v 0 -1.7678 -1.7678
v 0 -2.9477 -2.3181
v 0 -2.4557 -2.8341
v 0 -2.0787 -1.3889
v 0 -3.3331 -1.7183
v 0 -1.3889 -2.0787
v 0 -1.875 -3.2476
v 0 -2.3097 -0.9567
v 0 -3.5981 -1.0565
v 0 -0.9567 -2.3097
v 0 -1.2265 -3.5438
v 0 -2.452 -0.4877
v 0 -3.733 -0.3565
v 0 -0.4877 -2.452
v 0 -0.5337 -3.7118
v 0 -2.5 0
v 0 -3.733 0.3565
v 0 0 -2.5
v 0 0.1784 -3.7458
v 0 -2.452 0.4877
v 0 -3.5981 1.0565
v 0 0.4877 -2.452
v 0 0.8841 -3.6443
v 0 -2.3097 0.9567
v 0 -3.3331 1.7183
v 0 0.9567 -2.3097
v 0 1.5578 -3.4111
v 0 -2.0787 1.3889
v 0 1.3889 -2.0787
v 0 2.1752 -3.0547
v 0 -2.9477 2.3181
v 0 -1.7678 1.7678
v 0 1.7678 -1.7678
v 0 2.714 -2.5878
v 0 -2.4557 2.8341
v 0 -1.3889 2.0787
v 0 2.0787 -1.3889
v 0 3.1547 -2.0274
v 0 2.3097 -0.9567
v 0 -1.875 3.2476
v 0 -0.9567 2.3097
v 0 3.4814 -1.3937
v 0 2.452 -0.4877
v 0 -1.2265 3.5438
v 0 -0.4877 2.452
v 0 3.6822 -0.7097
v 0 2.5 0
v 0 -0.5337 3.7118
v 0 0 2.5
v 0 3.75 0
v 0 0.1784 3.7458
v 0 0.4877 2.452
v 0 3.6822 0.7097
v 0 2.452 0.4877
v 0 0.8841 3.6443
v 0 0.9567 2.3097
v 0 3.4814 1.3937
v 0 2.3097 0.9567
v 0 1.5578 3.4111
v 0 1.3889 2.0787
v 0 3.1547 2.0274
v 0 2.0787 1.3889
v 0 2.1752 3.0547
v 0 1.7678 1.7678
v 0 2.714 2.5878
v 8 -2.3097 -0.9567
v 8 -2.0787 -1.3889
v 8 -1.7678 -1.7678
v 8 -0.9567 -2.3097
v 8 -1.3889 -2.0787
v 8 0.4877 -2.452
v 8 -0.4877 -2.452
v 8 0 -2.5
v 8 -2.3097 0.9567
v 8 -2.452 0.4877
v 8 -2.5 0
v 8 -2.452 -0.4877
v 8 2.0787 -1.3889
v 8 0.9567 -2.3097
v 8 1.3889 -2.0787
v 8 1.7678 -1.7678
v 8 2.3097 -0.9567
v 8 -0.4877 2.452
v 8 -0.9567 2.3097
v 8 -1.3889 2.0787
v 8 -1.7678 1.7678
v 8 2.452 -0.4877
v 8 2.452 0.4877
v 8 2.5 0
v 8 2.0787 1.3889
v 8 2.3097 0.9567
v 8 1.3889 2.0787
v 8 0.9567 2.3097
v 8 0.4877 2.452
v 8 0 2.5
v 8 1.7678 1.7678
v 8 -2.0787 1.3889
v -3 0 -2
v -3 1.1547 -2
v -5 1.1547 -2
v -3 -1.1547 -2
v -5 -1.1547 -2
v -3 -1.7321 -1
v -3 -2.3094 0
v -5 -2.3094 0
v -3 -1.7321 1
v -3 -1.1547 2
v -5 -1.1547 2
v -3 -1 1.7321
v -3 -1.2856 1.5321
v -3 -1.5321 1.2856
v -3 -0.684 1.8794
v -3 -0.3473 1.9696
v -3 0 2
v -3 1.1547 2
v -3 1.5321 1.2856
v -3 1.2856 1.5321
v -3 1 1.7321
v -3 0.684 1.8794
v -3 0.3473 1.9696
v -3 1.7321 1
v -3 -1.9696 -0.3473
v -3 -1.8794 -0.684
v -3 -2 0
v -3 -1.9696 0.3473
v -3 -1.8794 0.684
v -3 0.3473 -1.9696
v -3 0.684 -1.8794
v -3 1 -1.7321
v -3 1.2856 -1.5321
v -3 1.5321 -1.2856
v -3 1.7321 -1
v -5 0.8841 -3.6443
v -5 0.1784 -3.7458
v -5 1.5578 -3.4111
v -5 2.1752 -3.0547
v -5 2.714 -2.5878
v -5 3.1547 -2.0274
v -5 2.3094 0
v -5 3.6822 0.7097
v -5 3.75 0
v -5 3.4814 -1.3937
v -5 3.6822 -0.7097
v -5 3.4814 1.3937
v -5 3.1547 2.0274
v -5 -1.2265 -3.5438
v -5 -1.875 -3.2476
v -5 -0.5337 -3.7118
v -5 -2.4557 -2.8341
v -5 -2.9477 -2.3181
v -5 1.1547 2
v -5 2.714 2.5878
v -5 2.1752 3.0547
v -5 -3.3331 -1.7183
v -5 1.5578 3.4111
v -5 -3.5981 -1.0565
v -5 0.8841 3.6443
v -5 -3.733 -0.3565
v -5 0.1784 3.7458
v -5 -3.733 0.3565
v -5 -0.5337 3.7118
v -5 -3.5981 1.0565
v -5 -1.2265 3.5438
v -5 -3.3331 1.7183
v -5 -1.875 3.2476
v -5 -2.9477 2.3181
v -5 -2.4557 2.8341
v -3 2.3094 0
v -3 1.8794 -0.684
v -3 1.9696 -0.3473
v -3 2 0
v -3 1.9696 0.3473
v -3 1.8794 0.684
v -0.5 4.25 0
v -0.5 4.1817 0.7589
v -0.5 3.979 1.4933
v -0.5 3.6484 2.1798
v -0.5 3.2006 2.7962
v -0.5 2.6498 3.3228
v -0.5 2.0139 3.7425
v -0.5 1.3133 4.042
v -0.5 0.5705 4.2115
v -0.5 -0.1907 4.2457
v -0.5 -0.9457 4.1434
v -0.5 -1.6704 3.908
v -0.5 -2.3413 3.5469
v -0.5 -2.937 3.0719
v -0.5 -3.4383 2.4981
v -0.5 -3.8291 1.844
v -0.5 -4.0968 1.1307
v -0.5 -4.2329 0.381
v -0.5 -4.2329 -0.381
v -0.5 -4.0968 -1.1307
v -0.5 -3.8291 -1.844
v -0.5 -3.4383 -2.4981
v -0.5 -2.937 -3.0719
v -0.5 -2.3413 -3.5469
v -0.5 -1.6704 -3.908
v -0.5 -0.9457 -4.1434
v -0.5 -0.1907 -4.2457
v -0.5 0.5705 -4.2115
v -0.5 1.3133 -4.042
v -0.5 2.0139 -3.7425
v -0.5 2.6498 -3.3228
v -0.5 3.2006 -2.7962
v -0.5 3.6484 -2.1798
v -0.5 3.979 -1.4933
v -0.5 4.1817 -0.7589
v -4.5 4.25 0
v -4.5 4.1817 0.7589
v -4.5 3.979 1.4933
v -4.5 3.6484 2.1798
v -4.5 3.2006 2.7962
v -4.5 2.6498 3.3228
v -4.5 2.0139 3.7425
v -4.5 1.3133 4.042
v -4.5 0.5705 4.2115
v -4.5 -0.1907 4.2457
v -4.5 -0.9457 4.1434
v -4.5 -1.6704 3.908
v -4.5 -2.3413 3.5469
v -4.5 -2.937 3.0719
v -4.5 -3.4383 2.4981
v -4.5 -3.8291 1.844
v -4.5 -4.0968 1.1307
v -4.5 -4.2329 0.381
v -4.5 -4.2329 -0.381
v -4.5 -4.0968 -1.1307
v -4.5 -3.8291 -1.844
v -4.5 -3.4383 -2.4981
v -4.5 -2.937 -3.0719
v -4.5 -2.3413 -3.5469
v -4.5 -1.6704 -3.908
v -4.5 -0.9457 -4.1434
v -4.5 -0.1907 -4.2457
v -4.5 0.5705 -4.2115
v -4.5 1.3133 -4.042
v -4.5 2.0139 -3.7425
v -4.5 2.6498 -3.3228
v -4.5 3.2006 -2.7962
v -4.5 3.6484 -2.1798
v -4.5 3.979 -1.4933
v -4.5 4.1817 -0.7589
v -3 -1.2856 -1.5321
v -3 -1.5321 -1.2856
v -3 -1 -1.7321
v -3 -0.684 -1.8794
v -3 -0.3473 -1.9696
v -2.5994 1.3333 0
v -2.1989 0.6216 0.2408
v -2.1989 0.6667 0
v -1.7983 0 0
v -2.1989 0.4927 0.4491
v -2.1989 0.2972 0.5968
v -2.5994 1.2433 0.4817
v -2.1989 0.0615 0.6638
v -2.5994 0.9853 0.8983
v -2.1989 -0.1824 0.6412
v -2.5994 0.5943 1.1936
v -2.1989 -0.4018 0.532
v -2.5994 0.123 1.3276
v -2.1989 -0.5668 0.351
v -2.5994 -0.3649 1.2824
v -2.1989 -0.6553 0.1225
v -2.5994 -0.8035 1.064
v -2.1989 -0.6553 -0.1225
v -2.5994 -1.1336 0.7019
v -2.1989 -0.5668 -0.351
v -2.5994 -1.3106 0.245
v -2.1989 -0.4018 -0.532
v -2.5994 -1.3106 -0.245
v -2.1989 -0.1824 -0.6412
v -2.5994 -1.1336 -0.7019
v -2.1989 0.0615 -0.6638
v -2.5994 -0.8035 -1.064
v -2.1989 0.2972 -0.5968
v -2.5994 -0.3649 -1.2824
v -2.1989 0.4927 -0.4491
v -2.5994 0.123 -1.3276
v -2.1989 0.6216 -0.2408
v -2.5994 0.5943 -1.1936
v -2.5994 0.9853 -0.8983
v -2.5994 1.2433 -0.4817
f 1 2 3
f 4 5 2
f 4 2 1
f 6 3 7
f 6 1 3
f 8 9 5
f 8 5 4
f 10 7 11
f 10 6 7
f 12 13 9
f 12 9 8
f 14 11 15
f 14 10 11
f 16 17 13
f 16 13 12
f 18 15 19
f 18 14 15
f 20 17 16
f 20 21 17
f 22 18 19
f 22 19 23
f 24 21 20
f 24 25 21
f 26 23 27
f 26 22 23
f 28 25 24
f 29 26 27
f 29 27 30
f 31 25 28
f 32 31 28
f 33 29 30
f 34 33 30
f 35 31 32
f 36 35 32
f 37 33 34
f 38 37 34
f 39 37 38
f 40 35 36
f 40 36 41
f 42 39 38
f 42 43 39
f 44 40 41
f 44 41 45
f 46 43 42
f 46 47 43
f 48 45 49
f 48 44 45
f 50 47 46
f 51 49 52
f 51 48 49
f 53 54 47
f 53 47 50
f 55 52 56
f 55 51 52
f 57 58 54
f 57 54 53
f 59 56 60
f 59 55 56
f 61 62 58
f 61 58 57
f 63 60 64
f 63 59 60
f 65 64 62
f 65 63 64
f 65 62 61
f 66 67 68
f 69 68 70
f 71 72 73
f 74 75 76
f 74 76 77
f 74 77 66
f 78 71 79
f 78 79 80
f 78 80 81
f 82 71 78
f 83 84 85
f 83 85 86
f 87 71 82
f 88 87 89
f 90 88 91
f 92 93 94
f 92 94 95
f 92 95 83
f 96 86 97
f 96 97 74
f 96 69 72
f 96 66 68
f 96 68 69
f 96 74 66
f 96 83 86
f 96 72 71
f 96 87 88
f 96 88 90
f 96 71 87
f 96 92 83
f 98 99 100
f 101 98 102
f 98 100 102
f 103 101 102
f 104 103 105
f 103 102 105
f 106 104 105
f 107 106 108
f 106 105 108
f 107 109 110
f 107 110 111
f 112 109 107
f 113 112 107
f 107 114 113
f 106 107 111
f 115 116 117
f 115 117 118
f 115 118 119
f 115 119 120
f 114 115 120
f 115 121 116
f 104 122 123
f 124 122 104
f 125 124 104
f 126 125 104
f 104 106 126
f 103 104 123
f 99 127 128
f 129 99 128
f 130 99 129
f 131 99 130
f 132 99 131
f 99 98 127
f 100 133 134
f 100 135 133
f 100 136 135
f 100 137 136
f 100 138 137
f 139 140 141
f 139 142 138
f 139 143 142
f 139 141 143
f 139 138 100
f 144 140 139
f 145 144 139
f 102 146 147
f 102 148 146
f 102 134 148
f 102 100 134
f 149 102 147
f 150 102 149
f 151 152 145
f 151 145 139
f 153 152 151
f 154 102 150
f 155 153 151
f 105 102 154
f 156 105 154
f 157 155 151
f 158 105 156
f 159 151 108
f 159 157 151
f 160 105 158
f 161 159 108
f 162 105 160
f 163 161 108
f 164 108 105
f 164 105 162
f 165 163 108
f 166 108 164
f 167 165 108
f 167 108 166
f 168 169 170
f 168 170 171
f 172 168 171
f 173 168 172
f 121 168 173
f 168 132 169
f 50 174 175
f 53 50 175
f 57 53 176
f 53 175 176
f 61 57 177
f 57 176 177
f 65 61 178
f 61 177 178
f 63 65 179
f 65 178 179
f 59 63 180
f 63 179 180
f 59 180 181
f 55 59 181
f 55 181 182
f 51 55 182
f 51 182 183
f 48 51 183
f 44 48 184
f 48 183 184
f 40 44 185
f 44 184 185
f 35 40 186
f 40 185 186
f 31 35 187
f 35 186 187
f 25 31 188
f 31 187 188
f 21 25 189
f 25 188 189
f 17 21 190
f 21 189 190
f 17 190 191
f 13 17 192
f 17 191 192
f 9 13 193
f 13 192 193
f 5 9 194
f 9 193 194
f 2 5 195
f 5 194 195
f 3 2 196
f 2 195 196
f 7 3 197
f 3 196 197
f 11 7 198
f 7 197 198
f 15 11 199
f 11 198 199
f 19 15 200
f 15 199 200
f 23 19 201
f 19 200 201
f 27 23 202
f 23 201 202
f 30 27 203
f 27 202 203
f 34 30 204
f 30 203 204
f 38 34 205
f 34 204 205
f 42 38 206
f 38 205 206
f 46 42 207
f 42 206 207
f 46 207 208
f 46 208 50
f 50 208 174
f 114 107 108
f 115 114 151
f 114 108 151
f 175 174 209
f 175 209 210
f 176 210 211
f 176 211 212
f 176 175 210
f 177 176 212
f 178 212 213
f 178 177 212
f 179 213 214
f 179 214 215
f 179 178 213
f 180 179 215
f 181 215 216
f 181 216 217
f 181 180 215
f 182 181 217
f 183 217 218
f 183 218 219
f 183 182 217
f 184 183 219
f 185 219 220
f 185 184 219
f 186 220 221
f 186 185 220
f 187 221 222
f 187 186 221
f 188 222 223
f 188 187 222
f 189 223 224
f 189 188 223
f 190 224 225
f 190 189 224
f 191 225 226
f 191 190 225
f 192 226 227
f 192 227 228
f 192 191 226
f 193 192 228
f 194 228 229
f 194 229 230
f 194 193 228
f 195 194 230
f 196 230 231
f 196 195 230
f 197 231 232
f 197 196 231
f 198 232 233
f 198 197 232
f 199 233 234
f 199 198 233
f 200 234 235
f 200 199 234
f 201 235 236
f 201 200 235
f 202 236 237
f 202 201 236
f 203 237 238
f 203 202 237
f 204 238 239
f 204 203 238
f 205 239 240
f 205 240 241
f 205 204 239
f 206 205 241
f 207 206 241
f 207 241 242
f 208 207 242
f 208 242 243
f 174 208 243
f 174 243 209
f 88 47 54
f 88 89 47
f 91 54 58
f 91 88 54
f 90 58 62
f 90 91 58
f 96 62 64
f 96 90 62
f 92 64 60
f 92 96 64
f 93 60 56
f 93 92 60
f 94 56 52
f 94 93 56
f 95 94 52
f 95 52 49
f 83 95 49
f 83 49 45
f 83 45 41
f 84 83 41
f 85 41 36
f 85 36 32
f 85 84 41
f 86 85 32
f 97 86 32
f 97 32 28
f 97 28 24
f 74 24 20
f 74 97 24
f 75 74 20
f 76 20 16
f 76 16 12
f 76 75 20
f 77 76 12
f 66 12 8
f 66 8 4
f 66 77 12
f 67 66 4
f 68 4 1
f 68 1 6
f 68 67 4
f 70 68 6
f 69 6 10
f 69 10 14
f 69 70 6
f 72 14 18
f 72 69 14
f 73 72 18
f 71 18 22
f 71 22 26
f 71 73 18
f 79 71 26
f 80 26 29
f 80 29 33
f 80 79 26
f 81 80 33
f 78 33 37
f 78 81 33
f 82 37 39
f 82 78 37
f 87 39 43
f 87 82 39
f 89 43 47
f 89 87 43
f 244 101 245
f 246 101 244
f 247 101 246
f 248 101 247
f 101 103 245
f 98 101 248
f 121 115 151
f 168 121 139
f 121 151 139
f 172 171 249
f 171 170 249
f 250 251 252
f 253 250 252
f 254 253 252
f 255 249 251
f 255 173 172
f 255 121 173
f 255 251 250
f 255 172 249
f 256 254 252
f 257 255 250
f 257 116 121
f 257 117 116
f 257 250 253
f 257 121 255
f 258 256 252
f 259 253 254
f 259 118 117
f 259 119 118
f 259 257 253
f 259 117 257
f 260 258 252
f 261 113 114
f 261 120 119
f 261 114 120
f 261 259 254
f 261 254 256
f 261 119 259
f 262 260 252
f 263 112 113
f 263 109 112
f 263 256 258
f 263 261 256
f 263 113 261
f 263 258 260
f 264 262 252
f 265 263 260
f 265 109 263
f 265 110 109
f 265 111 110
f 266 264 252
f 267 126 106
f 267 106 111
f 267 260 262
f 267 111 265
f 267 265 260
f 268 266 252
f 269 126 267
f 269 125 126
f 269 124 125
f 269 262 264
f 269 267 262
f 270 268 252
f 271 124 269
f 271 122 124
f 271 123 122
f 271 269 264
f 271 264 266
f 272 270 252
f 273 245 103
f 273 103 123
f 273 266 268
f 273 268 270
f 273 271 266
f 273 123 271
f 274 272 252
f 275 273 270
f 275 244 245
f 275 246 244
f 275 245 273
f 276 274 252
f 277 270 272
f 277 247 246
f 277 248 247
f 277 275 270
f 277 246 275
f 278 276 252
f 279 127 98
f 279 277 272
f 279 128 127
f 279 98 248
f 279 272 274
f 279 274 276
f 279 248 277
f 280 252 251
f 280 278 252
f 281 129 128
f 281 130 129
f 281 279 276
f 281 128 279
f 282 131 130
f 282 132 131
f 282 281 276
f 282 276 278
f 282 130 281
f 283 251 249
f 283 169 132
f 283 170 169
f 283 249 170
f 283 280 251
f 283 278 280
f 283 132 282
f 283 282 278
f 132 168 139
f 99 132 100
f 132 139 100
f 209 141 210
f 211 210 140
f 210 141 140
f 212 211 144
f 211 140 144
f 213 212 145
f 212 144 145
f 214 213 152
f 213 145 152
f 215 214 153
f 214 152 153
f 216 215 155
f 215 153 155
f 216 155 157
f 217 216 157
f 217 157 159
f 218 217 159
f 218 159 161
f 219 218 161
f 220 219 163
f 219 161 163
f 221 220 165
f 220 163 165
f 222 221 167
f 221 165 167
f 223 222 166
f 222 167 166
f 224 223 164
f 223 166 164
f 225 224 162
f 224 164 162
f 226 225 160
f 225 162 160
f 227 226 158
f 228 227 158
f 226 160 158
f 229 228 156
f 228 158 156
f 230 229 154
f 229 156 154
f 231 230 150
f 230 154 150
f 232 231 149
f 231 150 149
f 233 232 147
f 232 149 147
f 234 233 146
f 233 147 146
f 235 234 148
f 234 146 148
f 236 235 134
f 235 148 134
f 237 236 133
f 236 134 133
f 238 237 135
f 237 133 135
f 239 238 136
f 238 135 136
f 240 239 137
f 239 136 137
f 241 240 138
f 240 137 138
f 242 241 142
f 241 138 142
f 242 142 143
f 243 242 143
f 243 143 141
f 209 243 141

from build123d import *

# Parameters (mm, degrees)
CUT_EXTRUDE1_DEPTH = 2
CHAMFER1_SIZE      = 0.5


with BuildPart() as part:
    # Sketch1 → Revolve1 (revolve)
    with BuildSketch(Plane.XY):
        Polygon((0, 2.5), (8, 2.5), (8, 0), (-5, 0), (-5, 4.25), (0, 4.25), align=None)
    revolve(axis=Axis((-10.4, 0, 0), (1, 0, 0)))

    # Sketch2 → Cut-Revolve1 (revolve, cut)
    with BuildSketch(Plane.XY):
        Polygon((-1.798278762, 0), (-3, 2), (-5, 2), (-5, 0), align=None)
    revolve(axis=Axis((-10.4, 0, 0), (1, 0, 0)), mode=Mode.SUBTRACT)

    # Sketch3 → Cut-Extrude1 (cut)
    with BuildSketch(Plane.ZY.offset(5)):
        Polygon((2, 1.154700538), (0, 2.309401077), (-2, 1.154700538), (-2, -1.154700538), (0, -2.309401077), (2, -1.154700538), align=None)
    extrude(amount=-CUT_EXTRUDE1_DEPTH, mode=Mode.SUBTRACT)

    # Chamfer1
    chamfer1_edges = [part.edges().sort_by_distance(p)[0] for p in [
        (-5, -4.25, 0),
        (0, -4.25, 0),
    ]]
    chamfer(chamfer1_edges, length=CHAMFER1_SIZE)


solid = part.part
